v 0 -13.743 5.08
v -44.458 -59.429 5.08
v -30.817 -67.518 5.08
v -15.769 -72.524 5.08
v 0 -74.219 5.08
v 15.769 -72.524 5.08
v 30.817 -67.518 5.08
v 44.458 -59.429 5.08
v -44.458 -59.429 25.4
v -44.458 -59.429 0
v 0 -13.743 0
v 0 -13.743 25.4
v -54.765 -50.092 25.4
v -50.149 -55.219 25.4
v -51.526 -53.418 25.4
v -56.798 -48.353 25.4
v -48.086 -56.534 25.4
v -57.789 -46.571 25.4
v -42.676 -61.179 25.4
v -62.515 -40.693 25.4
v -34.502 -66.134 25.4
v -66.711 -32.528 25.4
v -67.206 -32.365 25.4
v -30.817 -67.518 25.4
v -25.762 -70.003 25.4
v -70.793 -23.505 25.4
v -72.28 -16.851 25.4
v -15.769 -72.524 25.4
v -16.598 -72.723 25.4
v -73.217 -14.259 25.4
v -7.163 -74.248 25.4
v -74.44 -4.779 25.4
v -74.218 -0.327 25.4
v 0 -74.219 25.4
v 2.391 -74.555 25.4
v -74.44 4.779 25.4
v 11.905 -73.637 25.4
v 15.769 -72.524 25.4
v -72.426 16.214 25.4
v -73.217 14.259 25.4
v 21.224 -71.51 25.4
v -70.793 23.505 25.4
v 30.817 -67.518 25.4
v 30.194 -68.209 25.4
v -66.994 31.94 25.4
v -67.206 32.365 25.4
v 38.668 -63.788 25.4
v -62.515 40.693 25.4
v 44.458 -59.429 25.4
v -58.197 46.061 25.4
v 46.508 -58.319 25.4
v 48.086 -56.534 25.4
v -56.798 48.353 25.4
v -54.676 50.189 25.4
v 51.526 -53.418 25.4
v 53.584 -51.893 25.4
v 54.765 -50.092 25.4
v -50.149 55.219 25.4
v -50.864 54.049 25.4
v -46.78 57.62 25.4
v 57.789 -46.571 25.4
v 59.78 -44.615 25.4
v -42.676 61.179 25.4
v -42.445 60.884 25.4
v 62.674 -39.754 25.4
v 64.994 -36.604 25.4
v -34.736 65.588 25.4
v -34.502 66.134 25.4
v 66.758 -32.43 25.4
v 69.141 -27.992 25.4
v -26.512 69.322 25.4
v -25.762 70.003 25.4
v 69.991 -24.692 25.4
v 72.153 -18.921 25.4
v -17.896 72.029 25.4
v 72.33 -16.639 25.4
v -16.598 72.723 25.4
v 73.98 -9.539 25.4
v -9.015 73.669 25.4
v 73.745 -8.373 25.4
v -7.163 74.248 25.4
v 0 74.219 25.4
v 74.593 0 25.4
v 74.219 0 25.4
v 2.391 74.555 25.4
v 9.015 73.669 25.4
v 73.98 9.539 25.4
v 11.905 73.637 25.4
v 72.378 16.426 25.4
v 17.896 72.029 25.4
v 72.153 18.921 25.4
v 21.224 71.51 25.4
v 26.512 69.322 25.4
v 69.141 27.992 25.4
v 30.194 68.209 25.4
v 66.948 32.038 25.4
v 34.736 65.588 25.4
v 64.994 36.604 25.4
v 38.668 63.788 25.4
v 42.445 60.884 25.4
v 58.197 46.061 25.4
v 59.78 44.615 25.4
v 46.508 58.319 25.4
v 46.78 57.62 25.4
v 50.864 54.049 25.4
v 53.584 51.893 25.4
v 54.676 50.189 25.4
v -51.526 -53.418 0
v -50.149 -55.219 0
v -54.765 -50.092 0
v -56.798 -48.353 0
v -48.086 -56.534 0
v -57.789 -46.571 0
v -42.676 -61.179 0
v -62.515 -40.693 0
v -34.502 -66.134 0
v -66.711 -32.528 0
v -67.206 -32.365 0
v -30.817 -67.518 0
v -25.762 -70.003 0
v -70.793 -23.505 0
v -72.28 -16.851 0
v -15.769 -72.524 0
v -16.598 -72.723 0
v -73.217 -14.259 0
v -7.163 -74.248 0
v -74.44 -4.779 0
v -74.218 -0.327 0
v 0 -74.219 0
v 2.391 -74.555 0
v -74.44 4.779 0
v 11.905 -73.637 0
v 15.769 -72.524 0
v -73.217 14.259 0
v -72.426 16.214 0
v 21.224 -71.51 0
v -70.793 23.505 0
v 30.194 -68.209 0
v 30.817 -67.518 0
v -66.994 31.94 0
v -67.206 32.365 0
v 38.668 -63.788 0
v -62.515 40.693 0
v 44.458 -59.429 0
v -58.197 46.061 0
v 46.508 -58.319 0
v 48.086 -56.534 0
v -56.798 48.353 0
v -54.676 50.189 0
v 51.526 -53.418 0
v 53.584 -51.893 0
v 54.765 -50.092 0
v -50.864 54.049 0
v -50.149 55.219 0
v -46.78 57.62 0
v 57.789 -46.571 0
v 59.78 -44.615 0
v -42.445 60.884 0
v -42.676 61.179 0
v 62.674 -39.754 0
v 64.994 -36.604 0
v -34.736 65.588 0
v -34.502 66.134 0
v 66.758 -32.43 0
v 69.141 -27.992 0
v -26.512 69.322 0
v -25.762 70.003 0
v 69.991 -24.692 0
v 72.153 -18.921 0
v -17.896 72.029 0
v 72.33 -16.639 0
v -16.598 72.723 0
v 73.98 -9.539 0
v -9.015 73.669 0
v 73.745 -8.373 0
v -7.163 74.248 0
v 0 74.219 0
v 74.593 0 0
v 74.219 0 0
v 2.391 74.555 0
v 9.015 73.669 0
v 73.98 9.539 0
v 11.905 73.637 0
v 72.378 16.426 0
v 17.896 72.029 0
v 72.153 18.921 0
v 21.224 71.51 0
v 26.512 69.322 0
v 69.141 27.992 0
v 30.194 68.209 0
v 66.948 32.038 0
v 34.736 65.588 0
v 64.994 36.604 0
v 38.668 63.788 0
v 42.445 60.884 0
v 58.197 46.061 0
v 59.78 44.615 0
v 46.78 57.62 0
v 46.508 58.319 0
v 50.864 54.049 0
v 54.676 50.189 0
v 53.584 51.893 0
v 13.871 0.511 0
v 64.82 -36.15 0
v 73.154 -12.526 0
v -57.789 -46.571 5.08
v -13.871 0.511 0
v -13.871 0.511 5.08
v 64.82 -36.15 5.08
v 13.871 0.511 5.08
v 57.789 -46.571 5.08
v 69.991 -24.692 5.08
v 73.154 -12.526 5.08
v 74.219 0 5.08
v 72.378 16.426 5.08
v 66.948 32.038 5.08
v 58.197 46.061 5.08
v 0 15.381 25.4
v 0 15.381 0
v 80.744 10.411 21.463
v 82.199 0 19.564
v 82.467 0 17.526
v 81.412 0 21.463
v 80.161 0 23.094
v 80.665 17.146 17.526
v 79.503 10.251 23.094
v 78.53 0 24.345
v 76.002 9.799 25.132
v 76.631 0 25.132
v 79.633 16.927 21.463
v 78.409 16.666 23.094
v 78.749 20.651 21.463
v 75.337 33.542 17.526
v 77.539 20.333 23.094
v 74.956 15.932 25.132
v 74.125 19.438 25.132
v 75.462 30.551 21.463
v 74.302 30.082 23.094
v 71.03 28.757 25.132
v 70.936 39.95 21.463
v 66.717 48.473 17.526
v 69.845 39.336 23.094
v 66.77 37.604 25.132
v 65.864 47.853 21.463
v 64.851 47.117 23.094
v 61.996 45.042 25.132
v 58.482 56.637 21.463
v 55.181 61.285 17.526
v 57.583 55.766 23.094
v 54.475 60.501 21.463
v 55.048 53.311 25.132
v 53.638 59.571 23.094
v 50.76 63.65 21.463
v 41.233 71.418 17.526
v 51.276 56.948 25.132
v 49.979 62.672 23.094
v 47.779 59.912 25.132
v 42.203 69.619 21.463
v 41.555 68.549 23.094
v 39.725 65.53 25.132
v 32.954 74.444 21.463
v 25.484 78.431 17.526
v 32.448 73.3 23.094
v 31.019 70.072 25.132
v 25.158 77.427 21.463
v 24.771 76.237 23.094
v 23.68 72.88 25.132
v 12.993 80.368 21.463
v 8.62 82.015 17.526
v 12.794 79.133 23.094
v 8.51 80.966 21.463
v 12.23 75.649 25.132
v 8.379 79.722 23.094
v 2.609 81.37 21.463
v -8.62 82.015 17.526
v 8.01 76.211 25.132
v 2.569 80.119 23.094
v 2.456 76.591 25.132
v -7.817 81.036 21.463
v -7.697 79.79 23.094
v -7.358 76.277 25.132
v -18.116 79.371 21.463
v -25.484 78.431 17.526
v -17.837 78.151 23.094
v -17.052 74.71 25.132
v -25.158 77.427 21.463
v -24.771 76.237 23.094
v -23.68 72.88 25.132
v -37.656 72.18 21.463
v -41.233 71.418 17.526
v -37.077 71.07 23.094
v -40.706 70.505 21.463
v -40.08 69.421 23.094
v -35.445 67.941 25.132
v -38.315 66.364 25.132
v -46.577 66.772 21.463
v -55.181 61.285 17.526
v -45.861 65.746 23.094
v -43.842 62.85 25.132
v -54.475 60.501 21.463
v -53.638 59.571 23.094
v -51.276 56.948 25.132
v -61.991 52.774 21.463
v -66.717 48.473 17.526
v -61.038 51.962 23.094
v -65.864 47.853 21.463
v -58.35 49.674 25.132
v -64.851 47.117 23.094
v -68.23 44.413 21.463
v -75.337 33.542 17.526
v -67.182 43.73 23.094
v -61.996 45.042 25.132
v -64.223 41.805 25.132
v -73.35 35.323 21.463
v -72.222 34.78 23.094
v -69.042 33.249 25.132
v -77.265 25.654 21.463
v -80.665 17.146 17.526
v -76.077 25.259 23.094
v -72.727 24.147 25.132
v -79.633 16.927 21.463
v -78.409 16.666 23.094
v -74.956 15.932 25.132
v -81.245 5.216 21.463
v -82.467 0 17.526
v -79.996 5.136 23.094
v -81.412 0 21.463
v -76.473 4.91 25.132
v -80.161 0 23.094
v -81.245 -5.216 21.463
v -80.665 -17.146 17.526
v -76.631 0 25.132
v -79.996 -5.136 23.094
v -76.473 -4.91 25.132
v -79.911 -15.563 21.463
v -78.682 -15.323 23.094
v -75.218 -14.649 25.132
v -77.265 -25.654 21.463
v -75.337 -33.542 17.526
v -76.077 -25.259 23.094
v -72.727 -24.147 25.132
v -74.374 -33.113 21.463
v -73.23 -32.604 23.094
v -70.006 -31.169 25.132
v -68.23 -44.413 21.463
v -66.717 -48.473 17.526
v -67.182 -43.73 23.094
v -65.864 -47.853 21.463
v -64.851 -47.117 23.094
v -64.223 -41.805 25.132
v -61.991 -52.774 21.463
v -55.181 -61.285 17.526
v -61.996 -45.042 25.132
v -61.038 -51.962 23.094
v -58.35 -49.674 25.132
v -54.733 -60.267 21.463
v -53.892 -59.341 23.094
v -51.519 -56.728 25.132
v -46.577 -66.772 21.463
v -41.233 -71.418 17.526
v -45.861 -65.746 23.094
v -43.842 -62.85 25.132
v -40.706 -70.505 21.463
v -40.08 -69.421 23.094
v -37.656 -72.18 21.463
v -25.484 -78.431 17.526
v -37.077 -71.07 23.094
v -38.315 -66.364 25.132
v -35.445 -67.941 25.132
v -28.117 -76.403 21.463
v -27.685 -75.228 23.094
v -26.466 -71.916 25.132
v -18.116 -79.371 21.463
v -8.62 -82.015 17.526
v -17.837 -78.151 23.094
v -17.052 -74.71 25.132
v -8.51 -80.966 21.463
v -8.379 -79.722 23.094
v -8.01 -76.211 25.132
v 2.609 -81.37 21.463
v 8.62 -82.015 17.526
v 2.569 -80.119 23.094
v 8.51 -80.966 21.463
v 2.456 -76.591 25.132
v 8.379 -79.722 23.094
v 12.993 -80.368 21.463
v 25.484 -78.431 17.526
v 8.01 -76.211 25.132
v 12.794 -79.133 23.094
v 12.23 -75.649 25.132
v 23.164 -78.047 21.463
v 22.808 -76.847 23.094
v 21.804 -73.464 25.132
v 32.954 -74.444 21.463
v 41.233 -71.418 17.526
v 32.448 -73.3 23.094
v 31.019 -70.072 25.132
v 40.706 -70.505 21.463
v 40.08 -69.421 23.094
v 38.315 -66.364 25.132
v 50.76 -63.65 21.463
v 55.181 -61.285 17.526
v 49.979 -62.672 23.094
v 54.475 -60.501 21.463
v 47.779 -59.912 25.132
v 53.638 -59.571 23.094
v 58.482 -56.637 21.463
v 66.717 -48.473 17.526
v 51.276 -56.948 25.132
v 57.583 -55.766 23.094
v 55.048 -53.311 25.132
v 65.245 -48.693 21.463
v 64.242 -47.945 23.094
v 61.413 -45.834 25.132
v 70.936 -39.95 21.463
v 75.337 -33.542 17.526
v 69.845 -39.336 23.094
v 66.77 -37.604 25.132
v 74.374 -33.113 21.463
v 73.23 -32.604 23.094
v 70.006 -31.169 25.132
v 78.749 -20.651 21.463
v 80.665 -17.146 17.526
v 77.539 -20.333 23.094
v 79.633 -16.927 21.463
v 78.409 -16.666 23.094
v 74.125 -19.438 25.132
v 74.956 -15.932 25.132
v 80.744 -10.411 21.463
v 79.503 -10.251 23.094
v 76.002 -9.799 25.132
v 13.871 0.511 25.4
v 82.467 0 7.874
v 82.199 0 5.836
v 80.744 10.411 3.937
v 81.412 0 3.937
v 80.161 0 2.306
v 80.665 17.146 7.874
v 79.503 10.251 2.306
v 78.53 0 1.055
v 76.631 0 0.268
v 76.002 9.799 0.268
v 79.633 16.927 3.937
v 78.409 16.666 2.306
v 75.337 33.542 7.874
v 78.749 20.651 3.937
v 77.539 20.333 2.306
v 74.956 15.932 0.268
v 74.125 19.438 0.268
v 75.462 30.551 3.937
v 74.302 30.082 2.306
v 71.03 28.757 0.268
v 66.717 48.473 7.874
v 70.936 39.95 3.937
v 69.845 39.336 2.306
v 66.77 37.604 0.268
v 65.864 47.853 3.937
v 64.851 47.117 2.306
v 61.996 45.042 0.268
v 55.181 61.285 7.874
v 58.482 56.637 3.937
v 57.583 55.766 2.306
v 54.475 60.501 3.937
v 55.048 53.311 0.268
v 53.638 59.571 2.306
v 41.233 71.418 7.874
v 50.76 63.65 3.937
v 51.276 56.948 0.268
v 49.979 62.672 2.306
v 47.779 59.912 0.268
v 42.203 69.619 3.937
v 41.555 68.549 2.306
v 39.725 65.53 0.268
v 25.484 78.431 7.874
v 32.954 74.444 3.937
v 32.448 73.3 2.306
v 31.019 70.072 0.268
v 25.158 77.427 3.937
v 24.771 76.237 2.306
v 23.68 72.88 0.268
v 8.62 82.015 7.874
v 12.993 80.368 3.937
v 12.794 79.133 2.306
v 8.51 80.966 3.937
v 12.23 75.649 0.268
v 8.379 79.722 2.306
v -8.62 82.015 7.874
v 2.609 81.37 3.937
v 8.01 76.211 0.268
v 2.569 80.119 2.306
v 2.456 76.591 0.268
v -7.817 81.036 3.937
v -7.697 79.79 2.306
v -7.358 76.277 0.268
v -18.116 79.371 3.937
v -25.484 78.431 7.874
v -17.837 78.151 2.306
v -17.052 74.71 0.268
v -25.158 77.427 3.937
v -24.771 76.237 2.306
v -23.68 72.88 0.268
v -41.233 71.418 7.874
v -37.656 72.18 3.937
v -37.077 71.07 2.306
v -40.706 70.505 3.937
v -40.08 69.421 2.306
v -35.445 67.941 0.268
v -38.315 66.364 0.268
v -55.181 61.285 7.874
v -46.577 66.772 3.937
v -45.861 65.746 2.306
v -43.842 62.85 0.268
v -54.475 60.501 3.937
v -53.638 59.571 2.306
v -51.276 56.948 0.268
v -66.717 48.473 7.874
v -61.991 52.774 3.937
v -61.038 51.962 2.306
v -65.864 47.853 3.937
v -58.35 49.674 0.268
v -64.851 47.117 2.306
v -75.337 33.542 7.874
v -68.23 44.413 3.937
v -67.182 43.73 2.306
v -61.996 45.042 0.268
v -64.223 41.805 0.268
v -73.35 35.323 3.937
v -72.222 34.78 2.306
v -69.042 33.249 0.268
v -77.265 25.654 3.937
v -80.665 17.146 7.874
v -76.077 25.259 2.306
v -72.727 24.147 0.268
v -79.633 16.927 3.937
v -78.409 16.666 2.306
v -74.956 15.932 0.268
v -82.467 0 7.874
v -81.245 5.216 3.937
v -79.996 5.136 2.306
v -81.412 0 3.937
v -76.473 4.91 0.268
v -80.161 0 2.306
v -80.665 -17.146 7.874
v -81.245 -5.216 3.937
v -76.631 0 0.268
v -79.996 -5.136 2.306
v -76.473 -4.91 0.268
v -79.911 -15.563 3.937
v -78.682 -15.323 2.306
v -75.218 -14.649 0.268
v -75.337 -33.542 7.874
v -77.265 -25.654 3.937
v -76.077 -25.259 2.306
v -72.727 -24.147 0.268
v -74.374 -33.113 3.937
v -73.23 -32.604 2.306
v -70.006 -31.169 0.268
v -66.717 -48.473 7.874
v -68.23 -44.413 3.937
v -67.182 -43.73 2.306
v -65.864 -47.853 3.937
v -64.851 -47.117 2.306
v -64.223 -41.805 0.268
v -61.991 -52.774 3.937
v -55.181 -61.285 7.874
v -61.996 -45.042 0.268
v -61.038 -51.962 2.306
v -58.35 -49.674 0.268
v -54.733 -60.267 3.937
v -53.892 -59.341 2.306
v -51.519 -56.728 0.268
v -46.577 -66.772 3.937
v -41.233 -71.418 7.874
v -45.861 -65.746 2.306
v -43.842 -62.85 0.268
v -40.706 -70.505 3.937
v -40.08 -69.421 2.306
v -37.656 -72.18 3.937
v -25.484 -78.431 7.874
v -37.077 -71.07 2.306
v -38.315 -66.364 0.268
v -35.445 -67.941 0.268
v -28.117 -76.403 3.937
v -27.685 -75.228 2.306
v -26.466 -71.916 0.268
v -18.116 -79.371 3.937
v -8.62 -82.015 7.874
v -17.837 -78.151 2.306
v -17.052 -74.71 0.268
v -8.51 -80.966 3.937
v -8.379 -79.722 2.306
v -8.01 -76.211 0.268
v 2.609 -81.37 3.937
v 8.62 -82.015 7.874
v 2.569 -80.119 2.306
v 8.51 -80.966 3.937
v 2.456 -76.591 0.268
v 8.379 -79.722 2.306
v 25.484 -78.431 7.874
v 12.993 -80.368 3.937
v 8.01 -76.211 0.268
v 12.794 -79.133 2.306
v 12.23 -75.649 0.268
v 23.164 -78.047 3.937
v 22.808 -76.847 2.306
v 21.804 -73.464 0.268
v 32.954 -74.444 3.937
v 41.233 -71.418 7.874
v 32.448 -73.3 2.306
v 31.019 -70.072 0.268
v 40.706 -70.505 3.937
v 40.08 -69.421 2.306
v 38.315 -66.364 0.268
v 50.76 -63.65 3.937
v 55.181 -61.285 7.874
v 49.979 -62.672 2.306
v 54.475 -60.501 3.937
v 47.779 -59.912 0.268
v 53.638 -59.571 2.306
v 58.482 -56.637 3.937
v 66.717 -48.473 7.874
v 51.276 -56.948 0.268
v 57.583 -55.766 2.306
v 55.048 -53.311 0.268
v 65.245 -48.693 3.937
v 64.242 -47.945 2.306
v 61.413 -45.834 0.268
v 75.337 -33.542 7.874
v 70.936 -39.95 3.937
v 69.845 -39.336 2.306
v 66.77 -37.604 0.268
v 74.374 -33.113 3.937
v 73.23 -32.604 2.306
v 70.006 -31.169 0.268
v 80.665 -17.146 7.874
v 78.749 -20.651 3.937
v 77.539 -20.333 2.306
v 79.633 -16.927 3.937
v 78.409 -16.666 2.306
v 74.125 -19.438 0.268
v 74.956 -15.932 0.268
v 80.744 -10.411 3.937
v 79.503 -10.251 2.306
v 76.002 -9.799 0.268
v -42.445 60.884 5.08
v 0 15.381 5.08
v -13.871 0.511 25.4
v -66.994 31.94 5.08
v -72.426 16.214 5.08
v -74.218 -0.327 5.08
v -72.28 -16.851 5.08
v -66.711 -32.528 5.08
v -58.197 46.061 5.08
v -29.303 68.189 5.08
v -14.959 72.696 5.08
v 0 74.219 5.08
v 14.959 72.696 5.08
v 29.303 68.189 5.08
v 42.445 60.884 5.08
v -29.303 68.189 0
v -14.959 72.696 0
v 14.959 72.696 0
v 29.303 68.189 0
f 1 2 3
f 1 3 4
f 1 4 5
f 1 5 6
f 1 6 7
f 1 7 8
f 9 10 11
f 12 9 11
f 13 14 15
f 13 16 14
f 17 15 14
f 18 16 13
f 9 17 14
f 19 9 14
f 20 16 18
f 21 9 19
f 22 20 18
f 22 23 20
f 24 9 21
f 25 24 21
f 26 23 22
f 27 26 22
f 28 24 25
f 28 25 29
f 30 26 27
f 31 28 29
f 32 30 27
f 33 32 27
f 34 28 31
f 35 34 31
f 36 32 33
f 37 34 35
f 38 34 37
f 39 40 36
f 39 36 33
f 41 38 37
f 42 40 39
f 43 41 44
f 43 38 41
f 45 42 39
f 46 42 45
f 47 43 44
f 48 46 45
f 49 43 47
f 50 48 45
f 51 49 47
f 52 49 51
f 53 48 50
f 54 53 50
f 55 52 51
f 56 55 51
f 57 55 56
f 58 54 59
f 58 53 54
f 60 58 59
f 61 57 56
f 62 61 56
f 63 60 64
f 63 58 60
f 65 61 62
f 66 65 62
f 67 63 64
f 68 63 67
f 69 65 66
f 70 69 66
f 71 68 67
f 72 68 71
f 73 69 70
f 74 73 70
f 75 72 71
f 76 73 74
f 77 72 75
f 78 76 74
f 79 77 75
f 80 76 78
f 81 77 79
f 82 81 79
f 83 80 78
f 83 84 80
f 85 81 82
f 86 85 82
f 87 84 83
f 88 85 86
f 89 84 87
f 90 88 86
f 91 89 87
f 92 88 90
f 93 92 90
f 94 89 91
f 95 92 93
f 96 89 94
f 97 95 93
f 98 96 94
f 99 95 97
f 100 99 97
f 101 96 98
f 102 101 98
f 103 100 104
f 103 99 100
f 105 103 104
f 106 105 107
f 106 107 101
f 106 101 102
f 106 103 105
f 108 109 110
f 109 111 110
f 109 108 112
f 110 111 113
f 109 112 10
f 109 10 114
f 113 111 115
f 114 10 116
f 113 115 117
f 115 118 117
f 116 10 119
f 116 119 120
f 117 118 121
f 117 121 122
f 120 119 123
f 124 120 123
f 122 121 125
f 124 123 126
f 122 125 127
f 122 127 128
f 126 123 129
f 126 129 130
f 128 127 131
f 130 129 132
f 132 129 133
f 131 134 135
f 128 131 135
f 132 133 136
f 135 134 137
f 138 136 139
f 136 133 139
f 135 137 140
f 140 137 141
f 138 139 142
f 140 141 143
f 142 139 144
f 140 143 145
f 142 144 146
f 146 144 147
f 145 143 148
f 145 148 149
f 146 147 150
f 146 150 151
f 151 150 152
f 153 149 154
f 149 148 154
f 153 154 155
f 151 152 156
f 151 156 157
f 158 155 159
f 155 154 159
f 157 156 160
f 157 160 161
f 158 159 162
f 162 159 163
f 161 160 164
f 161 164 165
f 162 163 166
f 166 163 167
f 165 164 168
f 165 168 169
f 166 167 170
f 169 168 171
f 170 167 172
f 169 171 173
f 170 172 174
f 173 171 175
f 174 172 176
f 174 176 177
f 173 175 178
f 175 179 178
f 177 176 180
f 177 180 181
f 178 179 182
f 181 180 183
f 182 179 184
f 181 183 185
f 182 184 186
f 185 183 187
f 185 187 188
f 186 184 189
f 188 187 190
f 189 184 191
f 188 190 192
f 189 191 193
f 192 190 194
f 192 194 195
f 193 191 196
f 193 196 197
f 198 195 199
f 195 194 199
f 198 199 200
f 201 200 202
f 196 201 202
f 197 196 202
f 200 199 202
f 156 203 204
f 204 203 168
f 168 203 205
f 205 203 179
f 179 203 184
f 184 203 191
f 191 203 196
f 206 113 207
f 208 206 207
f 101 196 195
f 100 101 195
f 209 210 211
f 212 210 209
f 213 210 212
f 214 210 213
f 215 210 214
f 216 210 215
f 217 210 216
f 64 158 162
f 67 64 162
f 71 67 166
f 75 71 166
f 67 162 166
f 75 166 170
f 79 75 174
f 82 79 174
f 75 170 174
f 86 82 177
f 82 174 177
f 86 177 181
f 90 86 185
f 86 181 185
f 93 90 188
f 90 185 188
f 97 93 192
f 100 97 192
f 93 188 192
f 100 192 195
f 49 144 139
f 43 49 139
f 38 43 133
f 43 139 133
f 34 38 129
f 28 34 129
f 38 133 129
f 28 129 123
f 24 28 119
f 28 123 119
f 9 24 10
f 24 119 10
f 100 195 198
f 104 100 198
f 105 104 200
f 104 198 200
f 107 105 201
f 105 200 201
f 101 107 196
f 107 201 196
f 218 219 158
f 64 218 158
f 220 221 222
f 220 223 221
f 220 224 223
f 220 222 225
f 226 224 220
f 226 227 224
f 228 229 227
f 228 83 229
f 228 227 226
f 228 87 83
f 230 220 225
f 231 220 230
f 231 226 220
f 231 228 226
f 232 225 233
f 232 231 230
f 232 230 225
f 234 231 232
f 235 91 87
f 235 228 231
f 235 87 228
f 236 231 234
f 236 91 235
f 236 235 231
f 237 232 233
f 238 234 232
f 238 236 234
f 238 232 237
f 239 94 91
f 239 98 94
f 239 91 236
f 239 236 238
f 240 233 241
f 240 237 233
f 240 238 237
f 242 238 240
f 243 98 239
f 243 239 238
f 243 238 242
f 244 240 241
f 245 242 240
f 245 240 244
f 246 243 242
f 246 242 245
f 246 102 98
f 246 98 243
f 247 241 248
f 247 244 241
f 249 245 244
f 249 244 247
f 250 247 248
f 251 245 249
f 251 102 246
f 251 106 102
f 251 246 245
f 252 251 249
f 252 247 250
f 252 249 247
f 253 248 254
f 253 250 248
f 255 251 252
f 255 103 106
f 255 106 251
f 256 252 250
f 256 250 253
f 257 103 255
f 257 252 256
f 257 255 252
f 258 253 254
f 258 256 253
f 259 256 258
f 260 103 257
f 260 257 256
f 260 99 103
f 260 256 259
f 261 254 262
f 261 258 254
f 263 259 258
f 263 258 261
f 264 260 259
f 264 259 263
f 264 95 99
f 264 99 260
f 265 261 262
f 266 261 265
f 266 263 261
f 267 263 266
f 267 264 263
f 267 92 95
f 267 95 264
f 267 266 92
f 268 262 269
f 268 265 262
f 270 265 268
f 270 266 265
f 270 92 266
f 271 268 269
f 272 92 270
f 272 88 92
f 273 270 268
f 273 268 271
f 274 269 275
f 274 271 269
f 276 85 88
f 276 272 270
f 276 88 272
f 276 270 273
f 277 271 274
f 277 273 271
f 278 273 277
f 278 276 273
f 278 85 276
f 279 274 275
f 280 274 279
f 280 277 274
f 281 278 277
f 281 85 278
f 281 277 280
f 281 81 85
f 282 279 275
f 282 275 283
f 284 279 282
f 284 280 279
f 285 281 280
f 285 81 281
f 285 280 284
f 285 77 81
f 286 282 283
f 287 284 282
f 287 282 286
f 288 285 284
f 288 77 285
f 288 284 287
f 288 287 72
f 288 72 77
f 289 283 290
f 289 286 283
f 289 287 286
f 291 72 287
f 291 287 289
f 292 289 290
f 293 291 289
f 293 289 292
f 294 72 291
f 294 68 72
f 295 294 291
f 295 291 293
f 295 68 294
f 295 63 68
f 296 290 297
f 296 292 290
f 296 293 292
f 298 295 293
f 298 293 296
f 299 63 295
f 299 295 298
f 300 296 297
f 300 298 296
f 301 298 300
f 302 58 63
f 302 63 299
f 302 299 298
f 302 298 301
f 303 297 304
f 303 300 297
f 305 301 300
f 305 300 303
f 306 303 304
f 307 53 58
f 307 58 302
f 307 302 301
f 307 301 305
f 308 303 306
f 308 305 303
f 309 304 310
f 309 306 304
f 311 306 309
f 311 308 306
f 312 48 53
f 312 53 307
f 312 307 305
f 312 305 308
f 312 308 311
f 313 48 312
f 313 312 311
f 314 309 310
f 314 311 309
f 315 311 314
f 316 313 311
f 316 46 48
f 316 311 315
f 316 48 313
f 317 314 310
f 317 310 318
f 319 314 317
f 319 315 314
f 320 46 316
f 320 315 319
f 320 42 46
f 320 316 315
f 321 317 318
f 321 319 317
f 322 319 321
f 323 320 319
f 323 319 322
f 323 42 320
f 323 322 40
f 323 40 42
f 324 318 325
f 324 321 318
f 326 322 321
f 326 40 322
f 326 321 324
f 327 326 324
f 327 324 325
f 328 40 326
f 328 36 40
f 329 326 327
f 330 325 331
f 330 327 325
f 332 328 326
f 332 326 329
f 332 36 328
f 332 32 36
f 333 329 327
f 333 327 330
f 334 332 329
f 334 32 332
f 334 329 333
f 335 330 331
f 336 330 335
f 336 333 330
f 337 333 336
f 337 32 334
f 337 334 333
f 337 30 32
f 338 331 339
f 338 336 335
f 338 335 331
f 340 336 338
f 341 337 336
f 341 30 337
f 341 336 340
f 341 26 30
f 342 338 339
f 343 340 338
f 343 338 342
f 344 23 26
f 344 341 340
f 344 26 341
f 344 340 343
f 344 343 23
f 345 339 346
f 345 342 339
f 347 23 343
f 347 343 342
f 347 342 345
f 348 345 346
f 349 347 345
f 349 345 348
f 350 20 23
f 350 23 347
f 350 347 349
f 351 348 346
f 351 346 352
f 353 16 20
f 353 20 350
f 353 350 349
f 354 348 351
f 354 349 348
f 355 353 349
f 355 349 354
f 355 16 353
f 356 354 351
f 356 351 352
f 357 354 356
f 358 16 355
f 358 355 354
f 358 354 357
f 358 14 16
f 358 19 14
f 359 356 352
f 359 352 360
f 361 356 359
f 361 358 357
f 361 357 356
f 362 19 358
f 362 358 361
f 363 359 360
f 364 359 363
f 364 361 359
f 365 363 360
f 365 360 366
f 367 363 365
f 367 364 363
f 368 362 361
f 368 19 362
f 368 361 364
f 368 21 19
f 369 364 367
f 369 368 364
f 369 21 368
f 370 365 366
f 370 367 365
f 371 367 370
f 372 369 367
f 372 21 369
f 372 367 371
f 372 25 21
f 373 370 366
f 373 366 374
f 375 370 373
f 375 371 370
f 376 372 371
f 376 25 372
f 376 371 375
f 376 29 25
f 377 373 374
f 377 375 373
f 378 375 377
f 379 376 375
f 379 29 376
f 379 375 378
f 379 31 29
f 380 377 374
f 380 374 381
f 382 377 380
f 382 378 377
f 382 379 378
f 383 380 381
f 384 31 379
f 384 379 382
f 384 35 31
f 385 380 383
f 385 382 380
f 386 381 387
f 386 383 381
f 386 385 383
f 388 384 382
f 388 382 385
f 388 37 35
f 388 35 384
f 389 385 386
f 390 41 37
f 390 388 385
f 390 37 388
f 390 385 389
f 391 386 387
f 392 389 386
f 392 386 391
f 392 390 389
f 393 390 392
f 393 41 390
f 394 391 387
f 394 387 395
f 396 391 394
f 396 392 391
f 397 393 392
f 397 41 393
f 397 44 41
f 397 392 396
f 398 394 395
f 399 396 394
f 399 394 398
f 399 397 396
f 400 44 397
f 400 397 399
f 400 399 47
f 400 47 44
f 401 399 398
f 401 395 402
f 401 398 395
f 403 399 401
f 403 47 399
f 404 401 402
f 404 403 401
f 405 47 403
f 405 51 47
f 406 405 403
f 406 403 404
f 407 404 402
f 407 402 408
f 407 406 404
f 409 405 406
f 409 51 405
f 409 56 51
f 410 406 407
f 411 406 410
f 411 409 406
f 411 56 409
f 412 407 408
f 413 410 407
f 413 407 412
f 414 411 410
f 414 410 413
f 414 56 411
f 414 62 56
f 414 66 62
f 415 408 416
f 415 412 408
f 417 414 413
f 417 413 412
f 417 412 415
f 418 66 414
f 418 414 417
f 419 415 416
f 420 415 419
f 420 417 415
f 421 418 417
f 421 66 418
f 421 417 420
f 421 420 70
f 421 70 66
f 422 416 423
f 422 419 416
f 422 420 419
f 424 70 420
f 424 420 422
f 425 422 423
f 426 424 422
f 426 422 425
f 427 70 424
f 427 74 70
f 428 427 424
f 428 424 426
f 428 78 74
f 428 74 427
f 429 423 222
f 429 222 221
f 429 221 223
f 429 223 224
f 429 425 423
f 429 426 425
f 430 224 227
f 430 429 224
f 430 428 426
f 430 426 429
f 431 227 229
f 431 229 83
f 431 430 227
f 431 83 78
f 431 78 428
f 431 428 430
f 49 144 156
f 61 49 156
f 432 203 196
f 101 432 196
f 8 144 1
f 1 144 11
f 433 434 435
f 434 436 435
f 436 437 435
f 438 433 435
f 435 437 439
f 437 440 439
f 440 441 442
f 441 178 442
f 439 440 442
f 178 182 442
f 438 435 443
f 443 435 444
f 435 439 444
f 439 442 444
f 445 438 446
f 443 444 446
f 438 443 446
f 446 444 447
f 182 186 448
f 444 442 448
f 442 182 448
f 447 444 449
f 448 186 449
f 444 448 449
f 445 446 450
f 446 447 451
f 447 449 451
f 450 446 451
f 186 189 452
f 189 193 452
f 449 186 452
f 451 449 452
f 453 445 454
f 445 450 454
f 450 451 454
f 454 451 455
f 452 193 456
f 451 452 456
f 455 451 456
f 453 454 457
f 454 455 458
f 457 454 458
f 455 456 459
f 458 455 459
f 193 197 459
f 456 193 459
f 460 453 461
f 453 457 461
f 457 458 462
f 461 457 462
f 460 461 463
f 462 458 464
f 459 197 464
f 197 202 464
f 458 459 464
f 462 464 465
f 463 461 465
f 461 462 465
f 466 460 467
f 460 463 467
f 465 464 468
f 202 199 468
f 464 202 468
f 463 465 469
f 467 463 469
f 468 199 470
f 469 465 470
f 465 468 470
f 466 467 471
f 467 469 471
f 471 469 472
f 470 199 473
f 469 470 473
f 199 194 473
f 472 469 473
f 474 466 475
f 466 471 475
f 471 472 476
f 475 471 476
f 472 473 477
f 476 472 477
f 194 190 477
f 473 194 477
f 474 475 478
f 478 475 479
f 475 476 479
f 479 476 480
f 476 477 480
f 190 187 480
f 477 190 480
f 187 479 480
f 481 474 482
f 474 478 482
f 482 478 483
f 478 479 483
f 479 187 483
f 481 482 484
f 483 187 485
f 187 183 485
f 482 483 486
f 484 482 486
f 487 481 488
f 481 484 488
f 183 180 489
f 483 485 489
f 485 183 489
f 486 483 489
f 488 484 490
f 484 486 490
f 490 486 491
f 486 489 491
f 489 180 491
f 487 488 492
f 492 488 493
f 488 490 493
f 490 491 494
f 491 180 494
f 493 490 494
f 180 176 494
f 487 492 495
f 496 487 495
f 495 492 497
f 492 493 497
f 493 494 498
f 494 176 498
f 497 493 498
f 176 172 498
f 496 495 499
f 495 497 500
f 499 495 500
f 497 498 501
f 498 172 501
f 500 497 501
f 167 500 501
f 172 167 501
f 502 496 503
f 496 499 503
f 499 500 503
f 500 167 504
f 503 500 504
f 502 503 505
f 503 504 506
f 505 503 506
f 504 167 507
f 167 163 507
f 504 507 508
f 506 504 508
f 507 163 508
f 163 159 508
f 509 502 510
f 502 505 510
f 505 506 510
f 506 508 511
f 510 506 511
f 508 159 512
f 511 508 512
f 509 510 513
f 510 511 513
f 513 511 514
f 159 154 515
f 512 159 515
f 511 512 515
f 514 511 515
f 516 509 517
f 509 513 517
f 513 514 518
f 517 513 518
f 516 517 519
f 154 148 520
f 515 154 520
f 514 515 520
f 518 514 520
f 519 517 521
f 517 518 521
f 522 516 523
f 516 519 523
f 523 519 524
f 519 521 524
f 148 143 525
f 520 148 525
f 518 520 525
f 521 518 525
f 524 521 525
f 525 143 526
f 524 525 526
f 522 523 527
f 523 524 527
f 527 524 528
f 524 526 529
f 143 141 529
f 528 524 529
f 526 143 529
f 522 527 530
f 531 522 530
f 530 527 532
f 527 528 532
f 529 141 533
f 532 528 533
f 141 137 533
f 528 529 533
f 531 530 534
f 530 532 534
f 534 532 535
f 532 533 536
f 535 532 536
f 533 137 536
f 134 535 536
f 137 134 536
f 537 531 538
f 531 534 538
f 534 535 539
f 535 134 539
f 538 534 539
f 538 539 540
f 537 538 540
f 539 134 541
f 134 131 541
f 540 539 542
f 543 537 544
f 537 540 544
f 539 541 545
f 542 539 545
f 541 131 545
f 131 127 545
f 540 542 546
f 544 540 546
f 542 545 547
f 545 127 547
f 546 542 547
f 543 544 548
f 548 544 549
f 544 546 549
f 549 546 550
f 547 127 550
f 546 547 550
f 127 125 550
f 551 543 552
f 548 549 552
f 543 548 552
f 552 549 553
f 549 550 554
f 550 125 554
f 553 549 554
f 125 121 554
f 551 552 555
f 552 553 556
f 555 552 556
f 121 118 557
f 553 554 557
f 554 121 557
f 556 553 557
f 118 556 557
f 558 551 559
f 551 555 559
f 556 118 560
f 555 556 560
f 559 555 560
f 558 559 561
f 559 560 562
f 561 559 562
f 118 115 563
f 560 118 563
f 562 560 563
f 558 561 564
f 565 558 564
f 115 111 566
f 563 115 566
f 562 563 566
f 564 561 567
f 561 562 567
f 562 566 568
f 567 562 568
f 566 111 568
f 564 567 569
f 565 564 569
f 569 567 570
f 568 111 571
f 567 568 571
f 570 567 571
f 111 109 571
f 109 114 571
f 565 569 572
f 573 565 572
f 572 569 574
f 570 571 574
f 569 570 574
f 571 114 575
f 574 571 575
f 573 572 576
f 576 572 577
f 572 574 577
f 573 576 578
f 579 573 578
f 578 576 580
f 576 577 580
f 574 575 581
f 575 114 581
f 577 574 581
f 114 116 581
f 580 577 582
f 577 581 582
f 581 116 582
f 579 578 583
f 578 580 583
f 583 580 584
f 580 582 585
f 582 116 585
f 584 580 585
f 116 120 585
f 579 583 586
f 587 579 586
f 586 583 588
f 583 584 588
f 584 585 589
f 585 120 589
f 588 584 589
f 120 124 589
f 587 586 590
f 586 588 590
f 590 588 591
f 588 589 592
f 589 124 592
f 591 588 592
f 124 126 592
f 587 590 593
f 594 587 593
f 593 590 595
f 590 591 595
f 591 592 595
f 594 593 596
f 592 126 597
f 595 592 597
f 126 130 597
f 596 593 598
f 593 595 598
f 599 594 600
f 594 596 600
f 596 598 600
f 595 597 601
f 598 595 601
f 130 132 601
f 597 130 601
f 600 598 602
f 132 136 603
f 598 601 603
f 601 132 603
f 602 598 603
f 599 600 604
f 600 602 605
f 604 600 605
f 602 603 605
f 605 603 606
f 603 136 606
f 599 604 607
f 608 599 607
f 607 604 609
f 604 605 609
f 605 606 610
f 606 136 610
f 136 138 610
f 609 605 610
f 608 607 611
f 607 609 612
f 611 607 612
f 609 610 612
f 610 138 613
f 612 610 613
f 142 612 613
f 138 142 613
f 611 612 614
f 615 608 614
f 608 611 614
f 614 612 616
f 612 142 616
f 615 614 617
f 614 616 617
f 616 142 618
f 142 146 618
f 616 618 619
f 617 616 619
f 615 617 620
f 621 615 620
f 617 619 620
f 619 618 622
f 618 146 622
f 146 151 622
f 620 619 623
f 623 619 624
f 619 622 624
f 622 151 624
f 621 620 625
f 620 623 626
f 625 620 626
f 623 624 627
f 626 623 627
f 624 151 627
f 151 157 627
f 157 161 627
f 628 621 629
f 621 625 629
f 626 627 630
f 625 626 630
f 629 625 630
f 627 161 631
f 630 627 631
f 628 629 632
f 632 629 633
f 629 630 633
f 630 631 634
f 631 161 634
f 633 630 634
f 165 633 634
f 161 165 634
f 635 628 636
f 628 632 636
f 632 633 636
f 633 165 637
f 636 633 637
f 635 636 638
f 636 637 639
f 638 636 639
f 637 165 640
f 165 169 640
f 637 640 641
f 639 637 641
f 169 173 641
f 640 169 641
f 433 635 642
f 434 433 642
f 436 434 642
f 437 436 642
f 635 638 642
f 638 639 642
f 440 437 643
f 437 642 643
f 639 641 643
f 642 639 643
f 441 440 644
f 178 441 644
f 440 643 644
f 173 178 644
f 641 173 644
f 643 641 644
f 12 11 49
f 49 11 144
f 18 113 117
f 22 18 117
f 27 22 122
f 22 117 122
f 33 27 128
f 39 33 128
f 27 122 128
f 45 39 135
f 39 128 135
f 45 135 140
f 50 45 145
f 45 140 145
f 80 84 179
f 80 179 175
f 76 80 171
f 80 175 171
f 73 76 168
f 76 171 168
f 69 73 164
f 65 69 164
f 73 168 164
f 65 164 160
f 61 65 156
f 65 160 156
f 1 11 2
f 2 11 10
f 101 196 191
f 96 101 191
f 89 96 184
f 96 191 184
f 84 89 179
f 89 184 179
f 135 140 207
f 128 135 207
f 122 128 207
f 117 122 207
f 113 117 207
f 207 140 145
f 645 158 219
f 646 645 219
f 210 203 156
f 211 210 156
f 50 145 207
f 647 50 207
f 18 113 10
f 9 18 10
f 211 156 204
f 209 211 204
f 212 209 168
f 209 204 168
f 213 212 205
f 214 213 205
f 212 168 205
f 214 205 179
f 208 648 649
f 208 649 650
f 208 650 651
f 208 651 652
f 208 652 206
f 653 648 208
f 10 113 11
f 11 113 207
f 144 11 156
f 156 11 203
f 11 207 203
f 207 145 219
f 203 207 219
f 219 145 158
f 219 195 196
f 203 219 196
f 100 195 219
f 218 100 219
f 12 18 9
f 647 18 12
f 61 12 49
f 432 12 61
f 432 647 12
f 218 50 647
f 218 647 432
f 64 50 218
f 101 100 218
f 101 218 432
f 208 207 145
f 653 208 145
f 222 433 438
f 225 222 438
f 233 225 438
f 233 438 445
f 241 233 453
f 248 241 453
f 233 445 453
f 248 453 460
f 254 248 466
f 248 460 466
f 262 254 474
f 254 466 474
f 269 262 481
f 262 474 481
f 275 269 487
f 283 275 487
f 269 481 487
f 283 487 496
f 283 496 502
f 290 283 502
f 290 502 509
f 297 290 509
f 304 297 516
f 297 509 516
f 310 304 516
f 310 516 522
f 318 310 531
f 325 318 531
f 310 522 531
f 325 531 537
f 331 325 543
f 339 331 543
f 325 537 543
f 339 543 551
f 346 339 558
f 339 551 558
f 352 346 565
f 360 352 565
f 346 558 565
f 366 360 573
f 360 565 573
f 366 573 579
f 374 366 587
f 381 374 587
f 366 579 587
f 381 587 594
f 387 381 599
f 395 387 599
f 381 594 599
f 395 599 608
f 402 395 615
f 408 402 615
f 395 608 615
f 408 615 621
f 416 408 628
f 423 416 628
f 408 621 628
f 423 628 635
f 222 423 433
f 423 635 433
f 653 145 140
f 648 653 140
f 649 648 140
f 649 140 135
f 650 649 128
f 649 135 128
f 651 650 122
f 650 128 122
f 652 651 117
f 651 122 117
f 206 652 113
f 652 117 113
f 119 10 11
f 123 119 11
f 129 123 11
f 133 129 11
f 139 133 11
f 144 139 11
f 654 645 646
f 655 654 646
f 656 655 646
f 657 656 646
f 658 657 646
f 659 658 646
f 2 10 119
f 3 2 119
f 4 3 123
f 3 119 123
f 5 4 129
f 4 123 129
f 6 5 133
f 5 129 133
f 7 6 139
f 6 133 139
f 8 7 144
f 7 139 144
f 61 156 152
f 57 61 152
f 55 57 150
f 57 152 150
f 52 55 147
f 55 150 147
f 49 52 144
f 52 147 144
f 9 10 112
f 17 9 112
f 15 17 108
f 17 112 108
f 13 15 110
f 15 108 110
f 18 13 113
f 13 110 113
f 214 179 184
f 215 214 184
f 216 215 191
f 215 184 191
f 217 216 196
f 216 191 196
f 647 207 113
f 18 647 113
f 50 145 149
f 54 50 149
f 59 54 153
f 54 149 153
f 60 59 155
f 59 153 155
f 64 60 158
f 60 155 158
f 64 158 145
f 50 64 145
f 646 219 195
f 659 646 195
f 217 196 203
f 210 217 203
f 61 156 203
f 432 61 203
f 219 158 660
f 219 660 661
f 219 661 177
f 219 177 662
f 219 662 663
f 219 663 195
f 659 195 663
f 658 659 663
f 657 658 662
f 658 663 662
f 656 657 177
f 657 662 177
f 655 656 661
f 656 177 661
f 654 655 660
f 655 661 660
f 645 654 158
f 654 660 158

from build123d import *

# Parameters (mm, degrees)
F1_DEPTH = 25.4
F0_R     = 82.4668975971
F2_DEPTH = 5.08
F3_R     = 7.874


with BuildPart() as f1:
    # F0 (on Top) → F1 (new body)
    with BuildSketch(Plane.XY):
        Polygon((0, 15.3806885805), (-42.4453695306, 60.8835004164), (-58.196512046, 46.0605688547), (-13.870812228, 0.5107283044), align=None)
        Polygon((13.870812228, 0.5107283044), (58.196512046, 46.0605688547), (42.4453695306, 60.8835004164), (0, 15.3806885805), align=None)
        Polygon((0, -13.7431534816), (13.870812228, 0.5107283044), (0, 15.3806885805), (-13.870812228, 0.5107283044), align=None)
        Polygon((-44.4584567484, -59.429417304), (0, -13.7431534816), (-13.870812228, 0.5107283044), (-57.7889264788, -46.5709136047), align=None)
        Polygon((44.4584567484, -59.429417304), (57.7889264788, -46.5709136047), (13.870812228, 0.5107283044), (0, -13.7431534816), align=None)
    extrude(amount=F1_DEPTH)


with BuildPart() as f1b:
    # F0 (on Top) → F1, piece 2 (new body)
    with BuildSketch(Plane.XY):
        Circle(F0_R)
        with BuildLine():
            ThreePointArc((58.196512046, 46.0605688547), (70.0987780359, 24.383833485), (74.2186635392, 0))
            ThreePointArc((74.2186635392, 0), (69.990809783, -24.6920344132), (57.7889264788, -46.5709136047))
            ThreePointArc((57.7889264788, -46.5709136047), (51.5263730875, -53.4176271843), (44.4584567484, -59.429417304))
            ThreePointArc((44.4584567484, -59.429417304), (0, -74.2186635392), (-44.4584567484, -59.429417304))
            ThreePointArc((-44.4584567484, -59.429417304), (-51.5263730875, -53.4176271843), (-57.7889264788, -46.5709136047))
            ThreePointArc((-57.7889264788, -46.5709136047), (-74.2179450881, -0.3265646025), (-58.196512046, 46.0605688547))
            ThreePointArc((-58.196512046, 46.0605688547), (-50.8638074356, 54.0488955549), (-42.4453695306, 60.8835004164))
            ThreePointArc((-42.4453695306, 60.8835004164), (0, 74.2186635392), (42.4453695306, 60.8835004164))
            ThreePointArc((42.4453695306, 60.8835004164), (50.8638074356, 54.0488955549), (58.196512046, 46.0605688547))
        make_face(mode=Mode.SUBTRACT)
    extrude(amount=F1_DEPTH)

    # F3
    f3_edges = [f1b.edges().sort_by_distance(p)[0] for p in [
        (-82.466898, 0, 25.4),
        (-82.466898, 0, 0),
    ]]
    fillet(f3_edges, radius=F3_R)


with BuildPart() as f2:
    # F0 (on Top) → F2 (new body)
    with BuildSketch(Plane.XY):
        with BuildLine():
            Line((-13.870812228, 0.5107283044), (-58.196512046, 46.0605688547))
            ThreePointArc((-58.196512046, 46.0605688547), (-74.2179450881, -0.3265646025), (-57.7889264788, -46.5709136047))
            Line((-57.7889264788, -46.5709136047), (-13.870812228, 0.5107283044))
        make_face()
    extrude(amount=F2_DEPTH)


with BuildPart() as f2b:
    # F0 (on Top) → F2, piece 2 (new body)
    with BuildSketch(Plane.XY):
        with BuildLine():
            Line((0, 15.3806885805), (42.4453695306, 60.8835004164))
            ThreePointArc((42.4453695306, 60.8835004164), (0, 74.2186635392), (-42.4453695306, 60.8835004164))
            Line((-42.4453695306, 60.8835004164), (0, 15.3806885805))
        make_face()
    extrude(amount=F2_DEPTH)


with BuildPart() as f2c:
    # F0 (on Top) → F2, piece 3 (new body)
    with BuildSketch(Plane.XY):
        with BuildLine():
            ThreePointArc((57.7889264788, -46.5709136047), (69.990809783, -24.6920344132), (74.2186635392, 0))
            ThreePointArc((74.2186635392, 0), (70.0987780359, 24.383833485), (58.196512046, 46.0605688547))
            Line((58.196512046, 46.0605688547), (13.870812228, 0.5107283044))
            Line((13.870812228, 0.5107283044), (57.7889264788, -46.5709136047))
        make_face()
    extrude(amount=F2_DEPTH)


with BuildPart() as f2d:
    # F0 (on Top) → F2, piece 4 (new body)
    with BuildSketch(Plane.XY):
        with BuildLine():
            ThreePointArc((-44.4584567484, -59.429417304), (0, -74.2186635392), (44.4584567484, -59.429417304))
            Line((44.4584567484, -59.429417304), (0, -13.7431534816))
            Line((0, -13.7431534816), (-44.4584567484, -59.429417304))
        make_face()
    extrude(amount=F2_DEPTH)


solid = Compound([f1.part, f1b.part, f2.part, f2b.part, f2c.part, f2d.part])
